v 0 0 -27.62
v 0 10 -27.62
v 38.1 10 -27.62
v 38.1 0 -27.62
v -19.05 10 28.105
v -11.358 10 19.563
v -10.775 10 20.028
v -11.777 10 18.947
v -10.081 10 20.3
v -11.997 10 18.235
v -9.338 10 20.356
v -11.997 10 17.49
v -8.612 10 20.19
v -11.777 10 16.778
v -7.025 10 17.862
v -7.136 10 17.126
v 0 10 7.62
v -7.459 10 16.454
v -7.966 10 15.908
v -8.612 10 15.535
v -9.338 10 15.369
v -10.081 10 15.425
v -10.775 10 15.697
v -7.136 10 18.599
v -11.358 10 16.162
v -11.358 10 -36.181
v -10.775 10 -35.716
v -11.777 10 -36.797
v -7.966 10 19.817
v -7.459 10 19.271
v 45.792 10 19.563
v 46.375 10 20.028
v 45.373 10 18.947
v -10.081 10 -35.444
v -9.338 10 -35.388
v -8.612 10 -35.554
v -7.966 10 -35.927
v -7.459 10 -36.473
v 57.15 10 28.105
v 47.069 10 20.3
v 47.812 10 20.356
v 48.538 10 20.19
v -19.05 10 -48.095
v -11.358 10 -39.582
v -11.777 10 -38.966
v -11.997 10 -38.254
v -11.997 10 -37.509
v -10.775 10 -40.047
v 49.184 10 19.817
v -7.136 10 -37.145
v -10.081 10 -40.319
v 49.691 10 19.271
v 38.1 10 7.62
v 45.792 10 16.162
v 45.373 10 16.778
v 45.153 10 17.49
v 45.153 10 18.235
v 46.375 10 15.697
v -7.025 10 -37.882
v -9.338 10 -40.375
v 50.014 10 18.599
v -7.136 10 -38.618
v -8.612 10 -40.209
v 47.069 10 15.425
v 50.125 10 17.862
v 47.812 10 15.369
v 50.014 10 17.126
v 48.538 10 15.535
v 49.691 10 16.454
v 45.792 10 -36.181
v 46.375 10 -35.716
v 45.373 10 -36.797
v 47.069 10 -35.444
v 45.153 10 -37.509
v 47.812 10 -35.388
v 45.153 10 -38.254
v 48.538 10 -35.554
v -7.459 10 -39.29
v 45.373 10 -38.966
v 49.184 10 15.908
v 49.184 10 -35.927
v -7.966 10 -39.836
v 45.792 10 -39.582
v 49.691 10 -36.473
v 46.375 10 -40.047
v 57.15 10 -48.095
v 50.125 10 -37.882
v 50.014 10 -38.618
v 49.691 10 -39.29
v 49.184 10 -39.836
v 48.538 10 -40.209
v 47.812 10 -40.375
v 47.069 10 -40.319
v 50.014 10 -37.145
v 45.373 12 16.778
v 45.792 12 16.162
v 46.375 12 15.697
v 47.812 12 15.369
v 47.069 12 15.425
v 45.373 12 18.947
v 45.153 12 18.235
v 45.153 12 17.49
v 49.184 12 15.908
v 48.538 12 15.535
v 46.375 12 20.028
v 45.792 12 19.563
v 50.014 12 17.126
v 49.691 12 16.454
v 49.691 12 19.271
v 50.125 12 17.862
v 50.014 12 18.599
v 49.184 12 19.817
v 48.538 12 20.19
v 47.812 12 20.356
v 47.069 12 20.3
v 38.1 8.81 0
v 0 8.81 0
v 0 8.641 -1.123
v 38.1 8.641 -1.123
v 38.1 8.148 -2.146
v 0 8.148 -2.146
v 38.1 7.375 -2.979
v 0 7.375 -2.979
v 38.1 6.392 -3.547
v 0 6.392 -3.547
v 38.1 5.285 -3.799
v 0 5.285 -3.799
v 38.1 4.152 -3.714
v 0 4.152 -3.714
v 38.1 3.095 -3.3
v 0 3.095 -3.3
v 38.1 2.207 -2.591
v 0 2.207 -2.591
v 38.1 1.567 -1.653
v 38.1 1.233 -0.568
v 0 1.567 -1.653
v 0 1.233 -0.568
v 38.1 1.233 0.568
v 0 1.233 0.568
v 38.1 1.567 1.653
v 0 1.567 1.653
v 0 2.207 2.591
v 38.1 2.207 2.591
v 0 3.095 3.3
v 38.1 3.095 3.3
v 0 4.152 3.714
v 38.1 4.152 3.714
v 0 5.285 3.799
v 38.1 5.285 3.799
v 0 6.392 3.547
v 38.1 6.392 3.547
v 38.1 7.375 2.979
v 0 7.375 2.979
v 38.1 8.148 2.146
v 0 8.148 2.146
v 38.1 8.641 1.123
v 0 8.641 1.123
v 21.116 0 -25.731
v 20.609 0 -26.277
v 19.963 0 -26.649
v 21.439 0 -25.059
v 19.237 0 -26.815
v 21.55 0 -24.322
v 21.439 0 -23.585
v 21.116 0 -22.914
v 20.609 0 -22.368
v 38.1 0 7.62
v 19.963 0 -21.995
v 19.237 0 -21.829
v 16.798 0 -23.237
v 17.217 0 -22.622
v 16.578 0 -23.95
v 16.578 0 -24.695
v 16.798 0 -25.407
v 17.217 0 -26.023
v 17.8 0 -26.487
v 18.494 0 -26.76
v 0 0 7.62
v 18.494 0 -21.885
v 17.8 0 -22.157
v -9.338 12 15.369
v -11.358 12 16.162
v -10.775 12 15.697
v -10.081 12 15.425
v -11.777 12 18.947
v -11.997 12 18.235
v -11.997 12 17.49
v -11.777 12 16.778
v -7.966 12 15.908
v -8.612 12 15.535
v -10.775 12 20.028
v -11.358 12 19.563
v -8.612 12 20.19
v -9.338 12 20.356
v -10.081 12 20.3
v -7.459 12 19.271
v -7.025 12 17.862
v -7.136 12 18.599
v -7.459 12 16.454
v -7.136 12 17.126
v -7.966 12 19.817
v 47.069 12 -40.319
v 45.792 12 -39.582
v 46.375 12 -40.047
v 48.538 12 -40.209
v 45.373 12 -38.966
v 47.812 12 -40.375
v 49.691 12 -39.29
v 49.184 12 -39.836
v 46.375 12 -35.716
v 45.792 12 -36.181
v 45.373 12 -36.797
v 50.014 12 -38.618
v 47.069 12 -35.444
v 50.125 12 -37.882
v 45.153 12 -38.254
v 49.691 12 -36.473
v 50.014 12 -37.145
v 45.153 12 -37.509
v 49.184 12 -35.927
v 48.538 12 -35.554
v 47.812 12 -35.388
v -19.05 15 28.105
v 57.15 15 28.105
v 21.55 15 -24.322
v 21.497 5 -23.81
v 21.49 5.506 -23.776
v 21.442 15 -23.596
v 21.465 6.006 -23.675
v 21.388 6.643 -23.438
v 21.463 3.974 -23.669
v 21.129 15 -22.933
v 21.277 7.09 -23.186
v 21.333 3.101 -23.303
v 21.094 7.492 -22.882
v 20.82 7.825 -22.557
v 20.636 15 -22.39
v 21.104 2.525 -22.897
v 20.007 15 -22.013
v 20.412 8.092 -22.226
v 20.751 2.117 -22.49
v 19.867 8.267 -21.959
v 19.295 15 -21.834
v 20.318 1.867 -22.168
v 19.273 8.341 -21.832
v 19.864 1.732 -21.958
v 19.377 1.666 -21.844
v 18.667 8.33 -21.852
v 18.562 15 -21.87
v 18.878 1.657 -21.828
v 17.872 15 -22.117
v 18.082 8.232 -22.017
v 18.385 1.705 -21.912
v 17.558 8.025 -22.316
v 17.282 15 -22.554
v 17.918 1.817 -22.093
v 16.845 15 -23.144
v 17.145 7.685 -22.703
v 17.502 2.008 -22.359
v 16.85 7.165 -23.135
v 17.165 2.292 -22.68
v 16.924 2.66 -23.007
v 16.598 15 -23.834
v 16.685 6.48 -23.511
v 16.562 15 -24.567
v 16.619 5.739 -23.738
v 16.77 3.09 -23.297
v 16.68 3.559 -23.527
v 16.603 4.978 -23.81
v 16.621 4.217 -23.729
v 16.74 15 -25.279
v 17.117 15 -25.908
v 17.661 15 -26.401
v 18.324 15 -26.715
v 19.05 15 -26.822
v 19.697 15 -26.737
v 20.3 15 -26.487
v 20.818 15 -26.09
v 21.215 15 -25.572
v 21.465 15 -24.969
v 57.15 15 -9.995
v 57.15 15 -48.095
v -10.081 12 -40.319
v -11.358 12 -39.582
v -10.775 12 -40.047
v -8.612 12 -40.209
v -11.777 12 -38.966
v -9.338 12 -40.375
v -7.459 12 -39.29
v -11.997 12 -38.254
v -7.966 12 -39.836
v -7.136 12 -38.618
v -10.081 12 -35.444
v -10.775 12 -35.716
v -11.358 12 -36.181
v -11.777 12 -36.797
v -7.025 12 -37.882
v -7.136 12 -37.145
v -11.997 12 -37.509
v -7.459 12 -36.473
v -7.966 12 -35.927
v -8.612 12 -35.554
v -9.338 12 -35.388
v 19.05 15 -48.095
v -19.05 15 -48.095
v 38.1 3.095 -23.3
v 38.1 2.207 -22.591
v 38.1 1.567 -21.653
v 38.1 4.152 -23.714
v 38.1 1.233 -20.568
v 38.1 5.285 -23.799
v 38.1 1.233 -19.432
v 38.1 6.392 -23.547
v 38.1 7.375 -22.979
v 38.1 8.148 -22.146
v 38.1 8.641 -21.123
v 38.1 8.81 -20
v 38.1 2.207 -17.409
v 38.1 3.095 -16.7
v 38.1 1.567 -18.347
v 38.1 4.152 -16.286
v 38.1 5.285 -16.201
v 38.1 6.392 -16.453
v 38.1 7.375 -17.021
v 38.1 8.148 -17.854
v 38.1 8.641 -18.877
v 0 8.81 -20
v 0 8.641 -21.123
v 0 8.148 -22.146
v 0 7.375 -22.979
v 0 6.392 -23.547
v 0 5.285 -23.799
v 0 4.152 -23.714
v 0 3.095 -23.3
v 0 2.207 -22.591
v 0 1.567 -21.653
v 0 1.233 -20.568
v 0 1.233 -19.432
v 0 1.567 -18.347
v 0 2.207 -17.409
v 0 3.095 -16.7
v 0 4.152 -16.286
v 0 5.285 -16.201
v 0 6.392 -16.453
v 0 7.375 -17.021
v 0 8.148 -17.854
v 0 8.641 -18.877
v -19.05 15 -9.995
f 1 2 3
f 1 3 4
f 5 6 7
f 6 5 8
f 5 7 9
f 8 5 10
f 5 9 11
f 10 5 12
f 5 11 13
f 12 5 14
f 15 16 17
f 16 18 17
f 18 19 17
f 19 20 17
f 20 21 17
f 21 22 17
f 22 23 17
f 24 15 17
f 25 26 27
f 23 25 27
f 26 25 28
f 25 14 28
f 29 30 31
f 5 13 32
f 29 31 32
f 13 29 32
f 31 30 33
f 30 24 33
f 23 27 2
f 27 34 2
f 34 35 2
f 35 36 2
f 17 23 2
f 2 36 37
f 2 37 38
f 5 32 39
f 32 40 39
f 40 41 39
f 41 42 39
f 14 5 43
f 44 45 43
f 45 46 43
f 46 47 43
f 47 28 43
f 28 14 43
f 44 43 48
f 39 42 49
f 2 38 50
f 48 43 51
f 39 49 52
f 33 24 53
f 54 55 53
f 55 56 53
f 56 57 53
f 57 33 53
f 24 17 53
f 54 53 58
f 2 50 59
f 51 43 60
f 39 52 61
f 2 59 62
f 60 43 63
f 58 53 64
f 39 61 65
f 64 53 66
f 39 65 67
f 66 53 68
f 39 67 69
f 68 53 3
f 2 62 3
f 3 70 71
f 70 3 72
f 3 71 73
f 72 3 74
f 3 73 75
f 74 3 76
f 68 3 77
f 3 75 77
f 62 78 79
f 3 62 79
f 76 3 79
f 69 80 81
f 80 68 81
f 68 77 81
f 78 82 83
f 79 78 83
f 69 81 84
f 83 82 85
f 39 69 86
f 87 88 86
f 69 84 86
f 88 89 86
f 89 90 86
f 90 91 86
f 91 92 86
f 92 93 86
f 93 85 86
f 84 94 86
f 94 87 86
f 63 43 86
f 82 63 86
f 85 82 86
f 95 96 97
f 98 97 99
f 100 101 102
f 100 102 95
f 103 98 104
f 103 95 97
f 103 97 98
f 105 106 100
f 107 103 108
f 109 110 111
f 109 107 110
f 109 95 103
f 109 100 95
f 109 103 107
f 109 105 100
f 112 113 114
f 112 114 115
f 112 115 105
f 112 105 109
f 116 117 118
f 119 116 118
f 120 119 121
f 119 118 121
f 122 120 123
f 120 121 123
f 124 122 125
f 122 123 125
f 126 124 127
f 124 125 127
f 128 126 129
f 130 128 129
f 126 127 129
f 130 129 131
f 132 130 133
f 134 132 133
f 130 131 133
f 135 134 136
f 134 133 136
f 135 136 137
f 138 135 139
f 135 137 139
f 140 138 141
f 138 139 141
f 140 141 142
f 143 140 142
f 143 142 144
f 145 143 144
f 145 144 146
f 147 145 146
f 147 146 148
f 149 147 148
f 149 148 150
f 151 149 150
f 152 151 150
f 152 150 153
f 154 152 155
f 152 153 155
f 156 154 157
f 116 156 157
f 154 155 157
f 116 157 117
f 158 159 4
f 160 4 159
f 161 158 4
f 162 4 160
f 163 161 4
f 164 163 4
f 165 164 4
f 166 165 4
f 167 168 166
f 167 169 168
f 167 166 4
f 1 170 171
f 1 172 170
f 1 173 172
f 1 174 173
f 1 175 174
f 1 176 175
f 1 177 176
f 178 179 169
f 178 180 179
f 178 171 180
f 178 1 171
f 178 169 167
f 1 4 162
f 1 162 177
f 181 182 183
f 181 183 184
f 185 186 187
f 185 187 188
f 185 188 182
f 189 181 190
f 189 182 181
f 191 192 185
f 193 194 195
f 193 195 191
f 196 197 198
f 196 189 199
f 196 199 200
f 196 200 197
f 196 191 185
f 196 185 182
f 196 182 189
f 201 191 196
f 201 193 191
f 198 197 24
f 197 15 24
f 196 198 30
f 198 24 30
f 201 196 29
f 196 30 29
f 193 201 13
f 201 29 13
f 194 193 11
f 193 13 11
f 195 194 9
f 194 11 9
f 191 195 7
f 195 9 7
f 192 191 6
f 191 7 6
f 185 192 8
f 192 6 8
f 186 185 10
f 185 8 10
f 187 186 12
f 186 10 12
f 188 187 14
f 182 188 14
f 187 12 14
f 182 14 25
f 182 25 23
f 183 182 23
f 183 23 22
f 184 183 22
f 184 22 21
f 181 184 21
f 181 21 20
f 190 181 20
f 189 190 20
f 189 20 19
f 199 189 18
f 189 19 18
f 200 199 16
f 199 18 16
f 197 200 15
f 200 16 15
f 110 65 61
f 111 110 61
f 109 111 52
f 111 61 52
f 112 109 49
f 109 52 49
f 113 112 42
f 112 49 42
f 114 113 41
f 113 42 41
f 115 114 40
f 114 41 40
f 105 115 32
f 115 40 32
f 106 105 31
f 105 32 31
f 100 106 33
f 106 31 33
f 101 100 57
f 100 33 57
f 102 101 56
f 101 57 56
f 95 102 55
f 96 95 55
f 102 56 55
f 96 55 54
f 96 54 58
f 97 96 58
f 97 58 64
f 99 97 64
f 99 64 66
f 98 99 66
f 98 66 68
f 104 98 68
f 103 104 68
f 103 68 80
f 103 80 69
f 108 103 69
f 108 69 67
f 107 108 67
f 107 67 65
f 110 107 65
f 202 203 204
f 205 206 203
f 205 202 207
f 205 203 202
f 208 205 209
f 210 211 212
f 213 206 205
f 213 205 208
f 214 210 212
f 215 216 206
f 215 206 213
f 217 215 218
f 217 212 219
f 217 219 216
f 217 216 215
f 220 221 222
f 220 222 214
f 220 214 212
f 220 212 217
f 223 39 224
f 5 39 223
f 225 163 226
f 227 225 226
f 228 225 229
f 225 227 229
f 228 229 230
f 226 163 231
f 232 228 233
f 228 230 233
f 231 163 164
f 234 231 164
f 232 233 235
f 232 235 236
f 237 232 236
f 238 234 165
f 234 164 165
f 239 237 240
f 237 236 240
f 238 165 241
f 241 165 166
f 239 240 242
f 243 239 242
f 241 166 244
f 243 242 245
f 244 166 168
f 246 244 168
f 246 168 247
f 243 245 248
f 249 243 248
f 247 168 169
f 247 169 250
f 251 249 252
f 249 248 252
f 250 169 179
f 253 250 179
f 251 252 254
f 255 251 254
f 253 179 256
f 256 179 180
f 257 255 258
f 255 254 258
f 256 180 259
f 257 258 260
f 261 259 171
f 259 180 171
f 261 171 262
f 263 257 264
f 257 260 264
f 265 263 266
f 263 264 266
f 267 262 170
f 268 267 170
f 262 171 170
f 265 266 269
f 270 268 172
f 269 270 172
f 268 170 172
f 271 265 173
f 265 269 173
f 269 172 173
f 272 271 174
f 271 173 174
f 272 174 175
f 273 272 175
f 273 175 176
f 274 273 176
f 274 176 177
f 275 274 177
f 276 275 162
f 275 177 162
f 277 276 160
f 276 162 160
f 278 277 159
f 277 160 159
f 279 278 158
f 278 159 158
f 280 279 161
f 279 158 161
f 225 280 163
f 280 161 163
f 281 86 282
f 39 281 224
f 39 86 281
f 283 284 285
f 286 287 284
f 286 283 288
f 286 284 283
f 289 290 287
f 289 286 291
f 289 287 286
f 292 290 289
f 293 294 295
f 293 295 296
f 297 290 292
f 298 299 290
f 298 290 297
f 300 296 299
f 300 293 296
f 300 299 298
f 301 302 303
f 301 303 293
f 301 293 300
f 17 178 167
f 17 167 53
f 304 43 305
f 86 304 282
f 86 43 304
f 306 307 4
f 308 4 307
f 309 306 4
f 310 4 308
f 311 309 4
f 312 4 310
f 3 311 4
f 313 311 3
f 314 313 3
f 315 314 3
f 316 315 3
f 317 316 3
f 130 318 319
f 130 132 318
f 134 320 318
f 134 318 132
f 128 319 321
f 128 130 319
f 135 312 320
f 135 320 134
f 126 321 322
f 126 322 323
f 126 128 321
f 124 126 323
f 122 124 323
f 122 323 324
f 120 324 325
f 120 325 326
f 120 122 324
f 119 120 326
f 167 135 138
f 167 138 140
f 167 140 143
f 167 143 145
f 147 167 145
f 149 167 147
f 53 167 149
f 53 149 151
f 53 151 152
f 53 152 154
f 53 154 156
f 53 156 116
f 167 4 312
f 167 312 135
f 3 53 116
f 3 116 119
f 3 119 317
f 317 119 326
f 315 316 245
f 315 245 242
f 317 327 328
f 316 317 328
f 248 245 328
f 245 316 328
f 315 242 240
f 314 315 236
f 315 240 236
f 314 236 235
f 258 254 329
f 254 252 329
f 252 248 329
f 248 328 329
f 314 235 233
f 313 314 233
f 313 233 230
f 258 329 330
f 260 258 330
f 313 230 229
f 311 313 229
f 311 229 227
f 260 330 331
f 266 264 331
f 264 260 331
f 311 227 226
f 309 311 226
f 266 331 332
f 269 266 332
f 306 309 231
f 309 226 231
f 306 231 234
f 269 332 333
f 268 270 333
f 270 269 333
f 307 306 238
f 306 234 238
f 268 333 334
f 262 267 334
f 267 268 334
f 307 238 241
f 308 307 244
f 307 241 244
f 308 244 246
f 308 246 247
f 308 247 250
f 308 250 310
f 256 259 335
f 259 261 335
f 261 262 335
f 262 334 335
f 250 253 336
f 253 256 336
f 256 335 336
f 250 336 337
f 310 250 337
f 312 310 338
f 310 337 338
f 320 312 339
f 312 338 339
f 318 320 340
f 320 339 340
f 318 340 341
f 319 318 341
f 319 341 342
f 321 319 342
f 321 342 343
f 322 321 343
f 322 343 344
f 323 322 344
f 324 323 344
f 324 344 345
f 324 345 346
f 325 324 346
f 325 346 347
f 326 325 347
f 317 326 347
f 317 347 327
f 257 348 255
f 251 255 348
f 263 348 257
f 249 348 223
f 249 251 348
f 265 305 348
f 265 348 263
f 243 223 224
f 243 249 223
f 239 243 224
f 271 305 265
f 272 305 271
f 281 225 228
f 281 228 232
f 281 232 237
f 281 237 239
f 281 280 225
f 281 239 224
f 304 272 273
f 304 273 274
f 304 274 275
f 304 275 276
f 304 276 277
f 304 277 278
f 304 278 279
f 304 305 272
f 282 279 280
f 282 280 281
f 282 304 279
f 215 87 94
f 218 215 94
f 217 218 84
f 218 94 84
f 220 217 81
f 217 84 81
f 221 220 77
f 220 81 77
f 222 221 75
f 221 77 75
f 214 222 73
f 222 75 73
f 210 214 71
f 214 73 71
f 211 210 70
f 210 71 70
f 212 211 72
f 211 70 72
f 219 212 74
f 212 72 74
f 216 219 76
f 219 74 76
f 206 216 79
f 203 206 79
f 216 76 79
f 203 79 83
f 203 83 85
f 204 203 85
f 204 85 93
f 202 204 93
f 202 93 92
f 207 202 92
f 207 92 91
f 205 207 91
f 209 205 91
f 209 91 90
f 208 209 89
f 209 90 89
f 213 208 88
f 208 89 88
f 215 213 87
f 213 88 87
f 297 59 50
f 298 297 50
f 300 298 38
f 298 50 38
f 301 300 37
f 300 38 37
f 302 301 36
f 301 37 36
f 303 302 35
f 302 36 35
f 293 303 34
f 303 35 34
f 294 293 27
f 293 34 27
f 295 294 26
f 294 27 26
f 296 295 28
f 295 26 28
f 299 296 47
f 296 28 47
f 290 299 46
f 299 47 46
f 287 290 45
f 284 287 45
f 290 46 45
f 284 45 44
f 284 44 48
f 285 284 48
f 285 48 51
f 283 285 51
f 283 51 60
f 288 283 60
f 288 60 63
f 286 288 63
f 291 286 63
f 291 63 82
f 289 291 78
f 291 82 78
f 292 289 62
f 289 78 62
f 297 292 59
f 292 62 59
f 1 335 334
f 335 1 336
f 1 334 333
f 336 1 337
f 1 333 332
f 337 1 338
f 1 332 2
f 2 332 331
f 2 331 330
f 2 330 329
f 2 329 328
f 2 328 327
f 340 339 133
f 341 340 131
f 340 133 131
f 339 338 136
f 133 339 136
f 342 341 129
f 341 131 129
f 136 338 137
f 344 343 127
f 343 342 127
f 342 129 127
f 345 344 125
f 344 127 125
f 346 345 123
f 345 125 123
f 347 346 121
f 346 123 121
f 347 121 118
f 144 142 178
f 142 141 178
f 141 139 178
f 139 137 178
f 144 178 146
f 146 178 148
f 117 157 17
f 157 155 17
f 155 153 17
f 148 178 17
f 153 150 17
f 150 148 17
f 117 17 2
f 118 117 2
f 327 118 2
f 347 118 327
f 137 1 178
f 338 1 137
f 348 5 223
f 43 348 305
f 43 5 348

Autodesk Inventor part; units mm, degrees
ref_plane "YZ Plane" through (0, 0, 0) normal (1, 0, 0) x (0, 1, 0)
ref_plane "XZ Plane" through (0, 0, 0) normal (0, 1, 0) x (-1, 0, 0)
ref_plane "XY Plane" through (0, 0, 0) normal (0, 0, 1) x (1, 0, 0)
sketch "Sketch1" plane through (0, 0, 0) normal (1, 0, 0) x (0, 1, 0)
  line L0 (0, 0) -> (10, 0)
  line L1 (10, 0) -> (10, -20)
  line L2 (10, -20) -> (0, -20)
  line L3 (0, -20) -> (0, 0)
  circle A0 centre (5, 0) radius 3.81
  circle A1 centre (5, -20) radius 3.81
  line L4 (10, 0) -> (0, 0)
  line L5 (0, 0) -> (0, 7.62)
  line L6 (0, 7.62) -> (10, 7.62)
  line L7 (10, 7.62) -> (10, 0)
  line L8 (0, -20) -> (10, -20)
  line L9 (10, -20) -> (10, -27.62)
  line L10 (10, -27.62) -> (0, -27.62)
  line L11 (0, -27.62) -> (0, -20)
  dimension "d0" = 10
  dimension "d1" = 20
  dimension "d2" = 7.62
  dimension "d3" = 7.62
  dimension "d4" = 10
  dimension "d5" = 7.62
  dimension "d7" = 7.62
extrude "Extrusion1" add sketch "Sketch1" along normal blind 38.1
extrude "Extrusion2" cut sketch "Sketch1" along normal blind 38.1 contours A0 L0 | L0 A0 | A1 L2 | L2 A1
sketch "Sketch2" plane through (0, 10, 7.62) normal (0, 1, 0) x (1, 0, 0)
  line L0 (57.15, -20.4851) -> (-19.05, -20.4851)
  line L1 (-19.05, -20.4851) -> (-19.05, 55.7149)
  line L2 (-19.05, 55.7149) -> (57.15, 55.7149)
  line L3 (57.15, 55.7149) -> (57.15, -20.4851)
  line L4 (57.15, -20.4851) -> (-19.05, 55.7149) construction
  line L5 (-19.05, -20.4851) -> (57.15, 55.7149) construction
  line L6 (0, 0) -> (38.1, 0) projected
  line L7 (0, 35.24) -> (38.1, 35.24) projected
  line L8 (-19.05, 17.6149) -> (4.7227, 17.6149)
  line L9 (57.15, 17.6149) -> (33.3773, 17.6149)
  circle A0 centre (4.7227, 17.6149) radius 2.5
  circle A1 centre (33.3773, 17.6149) radius 2.5
  line L10 (19.05, 55.7149) -> (19.05, 31.9422)
  circle A2 centre (19.05, 31.9422) radius 2.5
  point P0 (0, 7.62)
  point P1 (19.05, 17.6149)
  dimension "d12" = 17.6149
  dimension "d13" = 17.6251
  dimension "d14" = 35.24
  dimension "d15" = 76.2
  dimension "d16" = 76.2
  dimension "d17" = 19.05
  dimension "d32" = 23.7727
  dimension "d33" = 23.7727
  dimension "d34" = 5
  dimension "d35" = 5
  dimension "d38" = 23.7727
  dimension "d39" = 5
extrude "Extrusion3" add sketch "Sketch2" along normal blind 5 contours A1 | A2 | A0 | L0 L1 L2 L3
sketch "Sketch3" plane through (0, 10, 7.62) normal (0, -1, 0) x (1, 0, 0)
  line L0 (0, 0) -> (38.1, 0) projected
  line L1 (0, 0) -> (-19.05, 20.4851)
  line L2 (-19.05, 20.4851) -> (-19.05, -55.7149) projected
  line L3 (-19.05, -55.7149) -> (0, -35.2882)
  line L4 (57.15, -55.7149) -> (57.15, 20.4851) projected
  line L5 (57.15, -55.7149) -> (38.1, -35.2882)
  line L6 (38.1, 0) -> (57.15, 20.4851)
  circle A0 centre (47.625, -45.5015) radius 2.5
  circle A1 centre (47.625, 10.2425) radius 2.5
  circle A2 centre (-9.525, -45.5015) radius 2.5
  circle A3 centre (-9.525, 10.2425) radius 2.5
  point P0 (0, -7.62)
  dimension "d20" = 5
  dimension "d21" = 5
  dimension "d22" = 5
  dimension "d23" = 5
  dimension "d24" = 42.921
  dimension "d25" = 43.003
  dimension "d26" = 43.003
  dimension "d27" = 0
  dimension "d28" = 9.525
  dimension "d29" = 57.15
extrude "Extrusion4" cut sketch "Sketch3" against normal blind 2
extrude "Extrusion6" cut sketch "Sketch2" along normal mid plane 25.4 contours A2
thread "Thread1" size "M1x0.25" class "6H" standard "ISO Metric profile" full length
properties part number "plateform"
